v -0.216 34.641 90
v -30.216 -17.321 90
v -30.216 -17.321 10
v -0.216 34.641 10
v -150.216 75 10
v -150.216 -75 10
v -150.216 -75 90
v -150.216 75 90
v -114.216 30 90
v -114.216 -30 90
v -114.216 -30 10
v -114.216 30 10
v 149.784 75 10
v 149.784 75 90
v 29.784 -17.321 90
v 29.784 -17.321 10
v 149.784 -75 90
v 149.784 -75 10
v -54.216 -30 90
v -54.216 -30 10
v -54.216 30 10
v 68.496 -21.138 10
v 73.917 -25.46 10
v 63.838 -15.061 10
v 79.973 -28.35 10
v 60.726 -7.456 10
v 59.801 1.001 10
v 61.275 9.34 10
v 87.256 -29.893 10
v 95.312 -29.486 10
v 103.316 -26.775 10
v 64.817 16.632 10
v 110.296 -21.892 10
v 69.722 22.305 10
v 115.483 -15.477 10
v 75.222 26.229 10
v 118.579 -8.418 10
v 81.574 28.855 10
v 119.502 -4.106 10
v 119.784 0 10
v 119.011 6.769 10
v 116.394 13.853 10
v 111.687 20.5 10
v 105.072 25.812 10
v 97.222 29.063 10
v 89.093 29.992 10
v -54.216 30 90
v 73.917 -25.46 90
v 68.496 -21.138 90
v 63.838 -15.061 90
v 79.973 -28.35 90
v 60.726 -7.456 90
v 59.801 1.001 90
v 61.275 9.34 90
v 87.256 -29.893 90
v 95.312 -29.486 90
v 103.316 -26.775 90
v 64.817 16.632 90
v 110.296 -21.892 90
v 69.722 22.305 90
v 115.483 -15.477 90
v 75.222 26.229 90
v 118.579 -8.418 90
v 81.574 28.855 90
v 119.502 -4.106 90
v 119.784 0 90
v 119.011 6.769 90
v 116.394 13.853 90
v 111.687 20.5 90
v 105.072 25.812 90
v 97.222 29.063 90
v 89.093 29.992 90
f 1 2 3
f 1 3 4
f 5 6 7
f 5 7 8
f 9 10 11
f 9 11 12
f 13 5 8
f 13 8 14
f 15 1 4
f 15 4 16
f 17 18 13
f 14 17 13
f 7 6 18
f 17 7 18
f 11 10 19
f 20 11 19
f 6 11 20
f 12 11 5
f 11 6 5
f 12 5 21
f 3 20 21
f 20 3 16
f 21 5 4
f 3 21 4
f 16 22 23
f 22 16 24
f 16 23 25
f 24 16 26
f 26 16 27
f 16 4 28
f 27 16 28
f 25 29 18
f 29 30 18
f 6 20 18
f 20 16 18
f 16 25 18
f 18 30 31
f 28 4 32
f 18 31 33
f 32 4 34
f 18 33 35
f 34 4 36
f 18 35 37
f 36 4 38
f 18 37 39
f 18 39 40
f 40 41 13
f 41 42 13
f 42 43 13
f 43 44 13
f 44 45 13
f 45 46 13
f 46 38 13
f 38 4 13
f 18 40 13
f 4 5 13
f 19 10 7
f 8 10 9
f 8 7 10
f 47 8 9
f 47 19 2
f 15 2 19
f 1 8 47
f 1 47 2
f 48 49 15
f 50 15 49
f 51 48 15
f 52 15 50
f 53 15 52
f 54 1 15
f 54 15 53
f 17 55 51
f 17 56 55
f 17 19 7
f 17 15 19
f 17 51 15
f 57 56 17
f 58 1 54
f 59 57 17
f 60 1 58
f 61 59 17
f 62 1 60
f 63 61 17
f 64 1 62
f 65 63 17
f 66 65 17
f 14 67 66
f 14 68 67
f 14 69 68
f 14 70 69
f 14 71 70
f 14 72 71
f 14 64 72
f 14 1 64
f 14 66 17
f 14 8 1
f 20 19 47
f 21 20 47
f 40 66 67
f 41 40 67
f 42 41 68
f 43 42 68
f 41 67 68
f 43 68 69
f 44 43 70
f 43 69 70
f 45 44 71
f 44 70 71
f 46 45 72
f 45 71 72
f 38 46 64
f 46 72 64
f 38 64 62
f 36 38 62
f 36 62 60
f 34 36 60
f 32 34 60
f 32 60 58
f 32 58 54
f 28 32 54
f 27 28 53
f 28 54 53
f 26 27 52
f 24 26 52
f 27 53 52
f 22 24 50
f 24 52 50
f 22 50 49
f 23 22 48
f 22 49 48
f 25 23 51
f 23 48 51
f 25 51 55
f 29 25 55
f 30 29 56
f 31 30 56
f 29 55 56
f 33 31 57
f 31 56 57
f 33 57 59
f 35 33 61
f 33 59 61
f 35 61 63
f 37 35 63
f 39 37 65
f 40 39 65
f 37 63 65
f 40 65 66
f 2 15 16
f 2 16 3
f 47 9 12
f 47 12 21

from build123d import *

# Parameters (mm, degrees)
SKETCH1_W           = 250
SKETCH1_H           = 125
SKETCH1_W_2         = 230
SKETCH1_H_2         = 115
BOSS_EXTRUDE1_DEPTH = 100
SKETCH3_W           = 250
SKETCH3_H           = 125
SKETCH3_W_2         = 230
SKETCH3_H_2         = 115
SKETCH3_R           = 25
SKETCH3_W_3         = 50
SKETCH3_H_3         = 50
BOSS_EXTRUDE4_DEPTH = 100
SCALE2_SCALE_X      = 1.2
SCALE2_SCALE_Y      = 1.2
SCALE2_SCALE_Z      = 0.8


with BuildPart() as part:
    # Sketch1 → Boss-Extrude1 (new body)
    with BuildSketch(Plane.XY):
        Rectangle(SKETCH1_W, SKETCH1_H)
        Rectangle(SKETCH1_W_2, SKETCH1_H_2, mode=Mode.SUBTRACT)
    extrude(amount=BOSS_EXTRUDE1_DEPTH)

    # Sketch3 → Boss-Extrude4 (add)
    # profile 1 of 2: a face of its own
    with BuildSketch(Plane.XY.offset(100)):
        Rectangle(SKETCH3_W, SKETCH3_H)
        Rectangle(SKETCH3_W_2, SKETCH3_H_2, mode=Mode.SUBTRACT)
    # profile 2 of 2: a face of its own
    with BuildSketch(Plane.XY.offset(100)):
        Rectangle(SKETCH3_W_2, SKETCH3_H_2)
        with Locations((75, 0)):
            Circle(SKETCH3_R, mode=Mode.SUBTRACT)
        with Locations((-70, 0)):
            Rectangle(SKETCH3_W_3, SKETCH3_H_3, mode=Mode.SUBTRACT)
        Polygon((0, 28.867513459), (25, -14.43375673), (-25, -14.43375673), align=None, mode=Mode.SUBTRACT)
    extrude(amount=-BOSS_EXTRUDE4_DEPTH)


with BuildPart() as part_1:
    # Scale2: scaled about (1.079126738, 0, 50)
    add(part.part.scale((SCALE2_SCALE_X, SCALE2_SCALE_Y, SCALE2_SCALE_Z), about=(1.079126738, 0, 50)))


solid = part_1.part
